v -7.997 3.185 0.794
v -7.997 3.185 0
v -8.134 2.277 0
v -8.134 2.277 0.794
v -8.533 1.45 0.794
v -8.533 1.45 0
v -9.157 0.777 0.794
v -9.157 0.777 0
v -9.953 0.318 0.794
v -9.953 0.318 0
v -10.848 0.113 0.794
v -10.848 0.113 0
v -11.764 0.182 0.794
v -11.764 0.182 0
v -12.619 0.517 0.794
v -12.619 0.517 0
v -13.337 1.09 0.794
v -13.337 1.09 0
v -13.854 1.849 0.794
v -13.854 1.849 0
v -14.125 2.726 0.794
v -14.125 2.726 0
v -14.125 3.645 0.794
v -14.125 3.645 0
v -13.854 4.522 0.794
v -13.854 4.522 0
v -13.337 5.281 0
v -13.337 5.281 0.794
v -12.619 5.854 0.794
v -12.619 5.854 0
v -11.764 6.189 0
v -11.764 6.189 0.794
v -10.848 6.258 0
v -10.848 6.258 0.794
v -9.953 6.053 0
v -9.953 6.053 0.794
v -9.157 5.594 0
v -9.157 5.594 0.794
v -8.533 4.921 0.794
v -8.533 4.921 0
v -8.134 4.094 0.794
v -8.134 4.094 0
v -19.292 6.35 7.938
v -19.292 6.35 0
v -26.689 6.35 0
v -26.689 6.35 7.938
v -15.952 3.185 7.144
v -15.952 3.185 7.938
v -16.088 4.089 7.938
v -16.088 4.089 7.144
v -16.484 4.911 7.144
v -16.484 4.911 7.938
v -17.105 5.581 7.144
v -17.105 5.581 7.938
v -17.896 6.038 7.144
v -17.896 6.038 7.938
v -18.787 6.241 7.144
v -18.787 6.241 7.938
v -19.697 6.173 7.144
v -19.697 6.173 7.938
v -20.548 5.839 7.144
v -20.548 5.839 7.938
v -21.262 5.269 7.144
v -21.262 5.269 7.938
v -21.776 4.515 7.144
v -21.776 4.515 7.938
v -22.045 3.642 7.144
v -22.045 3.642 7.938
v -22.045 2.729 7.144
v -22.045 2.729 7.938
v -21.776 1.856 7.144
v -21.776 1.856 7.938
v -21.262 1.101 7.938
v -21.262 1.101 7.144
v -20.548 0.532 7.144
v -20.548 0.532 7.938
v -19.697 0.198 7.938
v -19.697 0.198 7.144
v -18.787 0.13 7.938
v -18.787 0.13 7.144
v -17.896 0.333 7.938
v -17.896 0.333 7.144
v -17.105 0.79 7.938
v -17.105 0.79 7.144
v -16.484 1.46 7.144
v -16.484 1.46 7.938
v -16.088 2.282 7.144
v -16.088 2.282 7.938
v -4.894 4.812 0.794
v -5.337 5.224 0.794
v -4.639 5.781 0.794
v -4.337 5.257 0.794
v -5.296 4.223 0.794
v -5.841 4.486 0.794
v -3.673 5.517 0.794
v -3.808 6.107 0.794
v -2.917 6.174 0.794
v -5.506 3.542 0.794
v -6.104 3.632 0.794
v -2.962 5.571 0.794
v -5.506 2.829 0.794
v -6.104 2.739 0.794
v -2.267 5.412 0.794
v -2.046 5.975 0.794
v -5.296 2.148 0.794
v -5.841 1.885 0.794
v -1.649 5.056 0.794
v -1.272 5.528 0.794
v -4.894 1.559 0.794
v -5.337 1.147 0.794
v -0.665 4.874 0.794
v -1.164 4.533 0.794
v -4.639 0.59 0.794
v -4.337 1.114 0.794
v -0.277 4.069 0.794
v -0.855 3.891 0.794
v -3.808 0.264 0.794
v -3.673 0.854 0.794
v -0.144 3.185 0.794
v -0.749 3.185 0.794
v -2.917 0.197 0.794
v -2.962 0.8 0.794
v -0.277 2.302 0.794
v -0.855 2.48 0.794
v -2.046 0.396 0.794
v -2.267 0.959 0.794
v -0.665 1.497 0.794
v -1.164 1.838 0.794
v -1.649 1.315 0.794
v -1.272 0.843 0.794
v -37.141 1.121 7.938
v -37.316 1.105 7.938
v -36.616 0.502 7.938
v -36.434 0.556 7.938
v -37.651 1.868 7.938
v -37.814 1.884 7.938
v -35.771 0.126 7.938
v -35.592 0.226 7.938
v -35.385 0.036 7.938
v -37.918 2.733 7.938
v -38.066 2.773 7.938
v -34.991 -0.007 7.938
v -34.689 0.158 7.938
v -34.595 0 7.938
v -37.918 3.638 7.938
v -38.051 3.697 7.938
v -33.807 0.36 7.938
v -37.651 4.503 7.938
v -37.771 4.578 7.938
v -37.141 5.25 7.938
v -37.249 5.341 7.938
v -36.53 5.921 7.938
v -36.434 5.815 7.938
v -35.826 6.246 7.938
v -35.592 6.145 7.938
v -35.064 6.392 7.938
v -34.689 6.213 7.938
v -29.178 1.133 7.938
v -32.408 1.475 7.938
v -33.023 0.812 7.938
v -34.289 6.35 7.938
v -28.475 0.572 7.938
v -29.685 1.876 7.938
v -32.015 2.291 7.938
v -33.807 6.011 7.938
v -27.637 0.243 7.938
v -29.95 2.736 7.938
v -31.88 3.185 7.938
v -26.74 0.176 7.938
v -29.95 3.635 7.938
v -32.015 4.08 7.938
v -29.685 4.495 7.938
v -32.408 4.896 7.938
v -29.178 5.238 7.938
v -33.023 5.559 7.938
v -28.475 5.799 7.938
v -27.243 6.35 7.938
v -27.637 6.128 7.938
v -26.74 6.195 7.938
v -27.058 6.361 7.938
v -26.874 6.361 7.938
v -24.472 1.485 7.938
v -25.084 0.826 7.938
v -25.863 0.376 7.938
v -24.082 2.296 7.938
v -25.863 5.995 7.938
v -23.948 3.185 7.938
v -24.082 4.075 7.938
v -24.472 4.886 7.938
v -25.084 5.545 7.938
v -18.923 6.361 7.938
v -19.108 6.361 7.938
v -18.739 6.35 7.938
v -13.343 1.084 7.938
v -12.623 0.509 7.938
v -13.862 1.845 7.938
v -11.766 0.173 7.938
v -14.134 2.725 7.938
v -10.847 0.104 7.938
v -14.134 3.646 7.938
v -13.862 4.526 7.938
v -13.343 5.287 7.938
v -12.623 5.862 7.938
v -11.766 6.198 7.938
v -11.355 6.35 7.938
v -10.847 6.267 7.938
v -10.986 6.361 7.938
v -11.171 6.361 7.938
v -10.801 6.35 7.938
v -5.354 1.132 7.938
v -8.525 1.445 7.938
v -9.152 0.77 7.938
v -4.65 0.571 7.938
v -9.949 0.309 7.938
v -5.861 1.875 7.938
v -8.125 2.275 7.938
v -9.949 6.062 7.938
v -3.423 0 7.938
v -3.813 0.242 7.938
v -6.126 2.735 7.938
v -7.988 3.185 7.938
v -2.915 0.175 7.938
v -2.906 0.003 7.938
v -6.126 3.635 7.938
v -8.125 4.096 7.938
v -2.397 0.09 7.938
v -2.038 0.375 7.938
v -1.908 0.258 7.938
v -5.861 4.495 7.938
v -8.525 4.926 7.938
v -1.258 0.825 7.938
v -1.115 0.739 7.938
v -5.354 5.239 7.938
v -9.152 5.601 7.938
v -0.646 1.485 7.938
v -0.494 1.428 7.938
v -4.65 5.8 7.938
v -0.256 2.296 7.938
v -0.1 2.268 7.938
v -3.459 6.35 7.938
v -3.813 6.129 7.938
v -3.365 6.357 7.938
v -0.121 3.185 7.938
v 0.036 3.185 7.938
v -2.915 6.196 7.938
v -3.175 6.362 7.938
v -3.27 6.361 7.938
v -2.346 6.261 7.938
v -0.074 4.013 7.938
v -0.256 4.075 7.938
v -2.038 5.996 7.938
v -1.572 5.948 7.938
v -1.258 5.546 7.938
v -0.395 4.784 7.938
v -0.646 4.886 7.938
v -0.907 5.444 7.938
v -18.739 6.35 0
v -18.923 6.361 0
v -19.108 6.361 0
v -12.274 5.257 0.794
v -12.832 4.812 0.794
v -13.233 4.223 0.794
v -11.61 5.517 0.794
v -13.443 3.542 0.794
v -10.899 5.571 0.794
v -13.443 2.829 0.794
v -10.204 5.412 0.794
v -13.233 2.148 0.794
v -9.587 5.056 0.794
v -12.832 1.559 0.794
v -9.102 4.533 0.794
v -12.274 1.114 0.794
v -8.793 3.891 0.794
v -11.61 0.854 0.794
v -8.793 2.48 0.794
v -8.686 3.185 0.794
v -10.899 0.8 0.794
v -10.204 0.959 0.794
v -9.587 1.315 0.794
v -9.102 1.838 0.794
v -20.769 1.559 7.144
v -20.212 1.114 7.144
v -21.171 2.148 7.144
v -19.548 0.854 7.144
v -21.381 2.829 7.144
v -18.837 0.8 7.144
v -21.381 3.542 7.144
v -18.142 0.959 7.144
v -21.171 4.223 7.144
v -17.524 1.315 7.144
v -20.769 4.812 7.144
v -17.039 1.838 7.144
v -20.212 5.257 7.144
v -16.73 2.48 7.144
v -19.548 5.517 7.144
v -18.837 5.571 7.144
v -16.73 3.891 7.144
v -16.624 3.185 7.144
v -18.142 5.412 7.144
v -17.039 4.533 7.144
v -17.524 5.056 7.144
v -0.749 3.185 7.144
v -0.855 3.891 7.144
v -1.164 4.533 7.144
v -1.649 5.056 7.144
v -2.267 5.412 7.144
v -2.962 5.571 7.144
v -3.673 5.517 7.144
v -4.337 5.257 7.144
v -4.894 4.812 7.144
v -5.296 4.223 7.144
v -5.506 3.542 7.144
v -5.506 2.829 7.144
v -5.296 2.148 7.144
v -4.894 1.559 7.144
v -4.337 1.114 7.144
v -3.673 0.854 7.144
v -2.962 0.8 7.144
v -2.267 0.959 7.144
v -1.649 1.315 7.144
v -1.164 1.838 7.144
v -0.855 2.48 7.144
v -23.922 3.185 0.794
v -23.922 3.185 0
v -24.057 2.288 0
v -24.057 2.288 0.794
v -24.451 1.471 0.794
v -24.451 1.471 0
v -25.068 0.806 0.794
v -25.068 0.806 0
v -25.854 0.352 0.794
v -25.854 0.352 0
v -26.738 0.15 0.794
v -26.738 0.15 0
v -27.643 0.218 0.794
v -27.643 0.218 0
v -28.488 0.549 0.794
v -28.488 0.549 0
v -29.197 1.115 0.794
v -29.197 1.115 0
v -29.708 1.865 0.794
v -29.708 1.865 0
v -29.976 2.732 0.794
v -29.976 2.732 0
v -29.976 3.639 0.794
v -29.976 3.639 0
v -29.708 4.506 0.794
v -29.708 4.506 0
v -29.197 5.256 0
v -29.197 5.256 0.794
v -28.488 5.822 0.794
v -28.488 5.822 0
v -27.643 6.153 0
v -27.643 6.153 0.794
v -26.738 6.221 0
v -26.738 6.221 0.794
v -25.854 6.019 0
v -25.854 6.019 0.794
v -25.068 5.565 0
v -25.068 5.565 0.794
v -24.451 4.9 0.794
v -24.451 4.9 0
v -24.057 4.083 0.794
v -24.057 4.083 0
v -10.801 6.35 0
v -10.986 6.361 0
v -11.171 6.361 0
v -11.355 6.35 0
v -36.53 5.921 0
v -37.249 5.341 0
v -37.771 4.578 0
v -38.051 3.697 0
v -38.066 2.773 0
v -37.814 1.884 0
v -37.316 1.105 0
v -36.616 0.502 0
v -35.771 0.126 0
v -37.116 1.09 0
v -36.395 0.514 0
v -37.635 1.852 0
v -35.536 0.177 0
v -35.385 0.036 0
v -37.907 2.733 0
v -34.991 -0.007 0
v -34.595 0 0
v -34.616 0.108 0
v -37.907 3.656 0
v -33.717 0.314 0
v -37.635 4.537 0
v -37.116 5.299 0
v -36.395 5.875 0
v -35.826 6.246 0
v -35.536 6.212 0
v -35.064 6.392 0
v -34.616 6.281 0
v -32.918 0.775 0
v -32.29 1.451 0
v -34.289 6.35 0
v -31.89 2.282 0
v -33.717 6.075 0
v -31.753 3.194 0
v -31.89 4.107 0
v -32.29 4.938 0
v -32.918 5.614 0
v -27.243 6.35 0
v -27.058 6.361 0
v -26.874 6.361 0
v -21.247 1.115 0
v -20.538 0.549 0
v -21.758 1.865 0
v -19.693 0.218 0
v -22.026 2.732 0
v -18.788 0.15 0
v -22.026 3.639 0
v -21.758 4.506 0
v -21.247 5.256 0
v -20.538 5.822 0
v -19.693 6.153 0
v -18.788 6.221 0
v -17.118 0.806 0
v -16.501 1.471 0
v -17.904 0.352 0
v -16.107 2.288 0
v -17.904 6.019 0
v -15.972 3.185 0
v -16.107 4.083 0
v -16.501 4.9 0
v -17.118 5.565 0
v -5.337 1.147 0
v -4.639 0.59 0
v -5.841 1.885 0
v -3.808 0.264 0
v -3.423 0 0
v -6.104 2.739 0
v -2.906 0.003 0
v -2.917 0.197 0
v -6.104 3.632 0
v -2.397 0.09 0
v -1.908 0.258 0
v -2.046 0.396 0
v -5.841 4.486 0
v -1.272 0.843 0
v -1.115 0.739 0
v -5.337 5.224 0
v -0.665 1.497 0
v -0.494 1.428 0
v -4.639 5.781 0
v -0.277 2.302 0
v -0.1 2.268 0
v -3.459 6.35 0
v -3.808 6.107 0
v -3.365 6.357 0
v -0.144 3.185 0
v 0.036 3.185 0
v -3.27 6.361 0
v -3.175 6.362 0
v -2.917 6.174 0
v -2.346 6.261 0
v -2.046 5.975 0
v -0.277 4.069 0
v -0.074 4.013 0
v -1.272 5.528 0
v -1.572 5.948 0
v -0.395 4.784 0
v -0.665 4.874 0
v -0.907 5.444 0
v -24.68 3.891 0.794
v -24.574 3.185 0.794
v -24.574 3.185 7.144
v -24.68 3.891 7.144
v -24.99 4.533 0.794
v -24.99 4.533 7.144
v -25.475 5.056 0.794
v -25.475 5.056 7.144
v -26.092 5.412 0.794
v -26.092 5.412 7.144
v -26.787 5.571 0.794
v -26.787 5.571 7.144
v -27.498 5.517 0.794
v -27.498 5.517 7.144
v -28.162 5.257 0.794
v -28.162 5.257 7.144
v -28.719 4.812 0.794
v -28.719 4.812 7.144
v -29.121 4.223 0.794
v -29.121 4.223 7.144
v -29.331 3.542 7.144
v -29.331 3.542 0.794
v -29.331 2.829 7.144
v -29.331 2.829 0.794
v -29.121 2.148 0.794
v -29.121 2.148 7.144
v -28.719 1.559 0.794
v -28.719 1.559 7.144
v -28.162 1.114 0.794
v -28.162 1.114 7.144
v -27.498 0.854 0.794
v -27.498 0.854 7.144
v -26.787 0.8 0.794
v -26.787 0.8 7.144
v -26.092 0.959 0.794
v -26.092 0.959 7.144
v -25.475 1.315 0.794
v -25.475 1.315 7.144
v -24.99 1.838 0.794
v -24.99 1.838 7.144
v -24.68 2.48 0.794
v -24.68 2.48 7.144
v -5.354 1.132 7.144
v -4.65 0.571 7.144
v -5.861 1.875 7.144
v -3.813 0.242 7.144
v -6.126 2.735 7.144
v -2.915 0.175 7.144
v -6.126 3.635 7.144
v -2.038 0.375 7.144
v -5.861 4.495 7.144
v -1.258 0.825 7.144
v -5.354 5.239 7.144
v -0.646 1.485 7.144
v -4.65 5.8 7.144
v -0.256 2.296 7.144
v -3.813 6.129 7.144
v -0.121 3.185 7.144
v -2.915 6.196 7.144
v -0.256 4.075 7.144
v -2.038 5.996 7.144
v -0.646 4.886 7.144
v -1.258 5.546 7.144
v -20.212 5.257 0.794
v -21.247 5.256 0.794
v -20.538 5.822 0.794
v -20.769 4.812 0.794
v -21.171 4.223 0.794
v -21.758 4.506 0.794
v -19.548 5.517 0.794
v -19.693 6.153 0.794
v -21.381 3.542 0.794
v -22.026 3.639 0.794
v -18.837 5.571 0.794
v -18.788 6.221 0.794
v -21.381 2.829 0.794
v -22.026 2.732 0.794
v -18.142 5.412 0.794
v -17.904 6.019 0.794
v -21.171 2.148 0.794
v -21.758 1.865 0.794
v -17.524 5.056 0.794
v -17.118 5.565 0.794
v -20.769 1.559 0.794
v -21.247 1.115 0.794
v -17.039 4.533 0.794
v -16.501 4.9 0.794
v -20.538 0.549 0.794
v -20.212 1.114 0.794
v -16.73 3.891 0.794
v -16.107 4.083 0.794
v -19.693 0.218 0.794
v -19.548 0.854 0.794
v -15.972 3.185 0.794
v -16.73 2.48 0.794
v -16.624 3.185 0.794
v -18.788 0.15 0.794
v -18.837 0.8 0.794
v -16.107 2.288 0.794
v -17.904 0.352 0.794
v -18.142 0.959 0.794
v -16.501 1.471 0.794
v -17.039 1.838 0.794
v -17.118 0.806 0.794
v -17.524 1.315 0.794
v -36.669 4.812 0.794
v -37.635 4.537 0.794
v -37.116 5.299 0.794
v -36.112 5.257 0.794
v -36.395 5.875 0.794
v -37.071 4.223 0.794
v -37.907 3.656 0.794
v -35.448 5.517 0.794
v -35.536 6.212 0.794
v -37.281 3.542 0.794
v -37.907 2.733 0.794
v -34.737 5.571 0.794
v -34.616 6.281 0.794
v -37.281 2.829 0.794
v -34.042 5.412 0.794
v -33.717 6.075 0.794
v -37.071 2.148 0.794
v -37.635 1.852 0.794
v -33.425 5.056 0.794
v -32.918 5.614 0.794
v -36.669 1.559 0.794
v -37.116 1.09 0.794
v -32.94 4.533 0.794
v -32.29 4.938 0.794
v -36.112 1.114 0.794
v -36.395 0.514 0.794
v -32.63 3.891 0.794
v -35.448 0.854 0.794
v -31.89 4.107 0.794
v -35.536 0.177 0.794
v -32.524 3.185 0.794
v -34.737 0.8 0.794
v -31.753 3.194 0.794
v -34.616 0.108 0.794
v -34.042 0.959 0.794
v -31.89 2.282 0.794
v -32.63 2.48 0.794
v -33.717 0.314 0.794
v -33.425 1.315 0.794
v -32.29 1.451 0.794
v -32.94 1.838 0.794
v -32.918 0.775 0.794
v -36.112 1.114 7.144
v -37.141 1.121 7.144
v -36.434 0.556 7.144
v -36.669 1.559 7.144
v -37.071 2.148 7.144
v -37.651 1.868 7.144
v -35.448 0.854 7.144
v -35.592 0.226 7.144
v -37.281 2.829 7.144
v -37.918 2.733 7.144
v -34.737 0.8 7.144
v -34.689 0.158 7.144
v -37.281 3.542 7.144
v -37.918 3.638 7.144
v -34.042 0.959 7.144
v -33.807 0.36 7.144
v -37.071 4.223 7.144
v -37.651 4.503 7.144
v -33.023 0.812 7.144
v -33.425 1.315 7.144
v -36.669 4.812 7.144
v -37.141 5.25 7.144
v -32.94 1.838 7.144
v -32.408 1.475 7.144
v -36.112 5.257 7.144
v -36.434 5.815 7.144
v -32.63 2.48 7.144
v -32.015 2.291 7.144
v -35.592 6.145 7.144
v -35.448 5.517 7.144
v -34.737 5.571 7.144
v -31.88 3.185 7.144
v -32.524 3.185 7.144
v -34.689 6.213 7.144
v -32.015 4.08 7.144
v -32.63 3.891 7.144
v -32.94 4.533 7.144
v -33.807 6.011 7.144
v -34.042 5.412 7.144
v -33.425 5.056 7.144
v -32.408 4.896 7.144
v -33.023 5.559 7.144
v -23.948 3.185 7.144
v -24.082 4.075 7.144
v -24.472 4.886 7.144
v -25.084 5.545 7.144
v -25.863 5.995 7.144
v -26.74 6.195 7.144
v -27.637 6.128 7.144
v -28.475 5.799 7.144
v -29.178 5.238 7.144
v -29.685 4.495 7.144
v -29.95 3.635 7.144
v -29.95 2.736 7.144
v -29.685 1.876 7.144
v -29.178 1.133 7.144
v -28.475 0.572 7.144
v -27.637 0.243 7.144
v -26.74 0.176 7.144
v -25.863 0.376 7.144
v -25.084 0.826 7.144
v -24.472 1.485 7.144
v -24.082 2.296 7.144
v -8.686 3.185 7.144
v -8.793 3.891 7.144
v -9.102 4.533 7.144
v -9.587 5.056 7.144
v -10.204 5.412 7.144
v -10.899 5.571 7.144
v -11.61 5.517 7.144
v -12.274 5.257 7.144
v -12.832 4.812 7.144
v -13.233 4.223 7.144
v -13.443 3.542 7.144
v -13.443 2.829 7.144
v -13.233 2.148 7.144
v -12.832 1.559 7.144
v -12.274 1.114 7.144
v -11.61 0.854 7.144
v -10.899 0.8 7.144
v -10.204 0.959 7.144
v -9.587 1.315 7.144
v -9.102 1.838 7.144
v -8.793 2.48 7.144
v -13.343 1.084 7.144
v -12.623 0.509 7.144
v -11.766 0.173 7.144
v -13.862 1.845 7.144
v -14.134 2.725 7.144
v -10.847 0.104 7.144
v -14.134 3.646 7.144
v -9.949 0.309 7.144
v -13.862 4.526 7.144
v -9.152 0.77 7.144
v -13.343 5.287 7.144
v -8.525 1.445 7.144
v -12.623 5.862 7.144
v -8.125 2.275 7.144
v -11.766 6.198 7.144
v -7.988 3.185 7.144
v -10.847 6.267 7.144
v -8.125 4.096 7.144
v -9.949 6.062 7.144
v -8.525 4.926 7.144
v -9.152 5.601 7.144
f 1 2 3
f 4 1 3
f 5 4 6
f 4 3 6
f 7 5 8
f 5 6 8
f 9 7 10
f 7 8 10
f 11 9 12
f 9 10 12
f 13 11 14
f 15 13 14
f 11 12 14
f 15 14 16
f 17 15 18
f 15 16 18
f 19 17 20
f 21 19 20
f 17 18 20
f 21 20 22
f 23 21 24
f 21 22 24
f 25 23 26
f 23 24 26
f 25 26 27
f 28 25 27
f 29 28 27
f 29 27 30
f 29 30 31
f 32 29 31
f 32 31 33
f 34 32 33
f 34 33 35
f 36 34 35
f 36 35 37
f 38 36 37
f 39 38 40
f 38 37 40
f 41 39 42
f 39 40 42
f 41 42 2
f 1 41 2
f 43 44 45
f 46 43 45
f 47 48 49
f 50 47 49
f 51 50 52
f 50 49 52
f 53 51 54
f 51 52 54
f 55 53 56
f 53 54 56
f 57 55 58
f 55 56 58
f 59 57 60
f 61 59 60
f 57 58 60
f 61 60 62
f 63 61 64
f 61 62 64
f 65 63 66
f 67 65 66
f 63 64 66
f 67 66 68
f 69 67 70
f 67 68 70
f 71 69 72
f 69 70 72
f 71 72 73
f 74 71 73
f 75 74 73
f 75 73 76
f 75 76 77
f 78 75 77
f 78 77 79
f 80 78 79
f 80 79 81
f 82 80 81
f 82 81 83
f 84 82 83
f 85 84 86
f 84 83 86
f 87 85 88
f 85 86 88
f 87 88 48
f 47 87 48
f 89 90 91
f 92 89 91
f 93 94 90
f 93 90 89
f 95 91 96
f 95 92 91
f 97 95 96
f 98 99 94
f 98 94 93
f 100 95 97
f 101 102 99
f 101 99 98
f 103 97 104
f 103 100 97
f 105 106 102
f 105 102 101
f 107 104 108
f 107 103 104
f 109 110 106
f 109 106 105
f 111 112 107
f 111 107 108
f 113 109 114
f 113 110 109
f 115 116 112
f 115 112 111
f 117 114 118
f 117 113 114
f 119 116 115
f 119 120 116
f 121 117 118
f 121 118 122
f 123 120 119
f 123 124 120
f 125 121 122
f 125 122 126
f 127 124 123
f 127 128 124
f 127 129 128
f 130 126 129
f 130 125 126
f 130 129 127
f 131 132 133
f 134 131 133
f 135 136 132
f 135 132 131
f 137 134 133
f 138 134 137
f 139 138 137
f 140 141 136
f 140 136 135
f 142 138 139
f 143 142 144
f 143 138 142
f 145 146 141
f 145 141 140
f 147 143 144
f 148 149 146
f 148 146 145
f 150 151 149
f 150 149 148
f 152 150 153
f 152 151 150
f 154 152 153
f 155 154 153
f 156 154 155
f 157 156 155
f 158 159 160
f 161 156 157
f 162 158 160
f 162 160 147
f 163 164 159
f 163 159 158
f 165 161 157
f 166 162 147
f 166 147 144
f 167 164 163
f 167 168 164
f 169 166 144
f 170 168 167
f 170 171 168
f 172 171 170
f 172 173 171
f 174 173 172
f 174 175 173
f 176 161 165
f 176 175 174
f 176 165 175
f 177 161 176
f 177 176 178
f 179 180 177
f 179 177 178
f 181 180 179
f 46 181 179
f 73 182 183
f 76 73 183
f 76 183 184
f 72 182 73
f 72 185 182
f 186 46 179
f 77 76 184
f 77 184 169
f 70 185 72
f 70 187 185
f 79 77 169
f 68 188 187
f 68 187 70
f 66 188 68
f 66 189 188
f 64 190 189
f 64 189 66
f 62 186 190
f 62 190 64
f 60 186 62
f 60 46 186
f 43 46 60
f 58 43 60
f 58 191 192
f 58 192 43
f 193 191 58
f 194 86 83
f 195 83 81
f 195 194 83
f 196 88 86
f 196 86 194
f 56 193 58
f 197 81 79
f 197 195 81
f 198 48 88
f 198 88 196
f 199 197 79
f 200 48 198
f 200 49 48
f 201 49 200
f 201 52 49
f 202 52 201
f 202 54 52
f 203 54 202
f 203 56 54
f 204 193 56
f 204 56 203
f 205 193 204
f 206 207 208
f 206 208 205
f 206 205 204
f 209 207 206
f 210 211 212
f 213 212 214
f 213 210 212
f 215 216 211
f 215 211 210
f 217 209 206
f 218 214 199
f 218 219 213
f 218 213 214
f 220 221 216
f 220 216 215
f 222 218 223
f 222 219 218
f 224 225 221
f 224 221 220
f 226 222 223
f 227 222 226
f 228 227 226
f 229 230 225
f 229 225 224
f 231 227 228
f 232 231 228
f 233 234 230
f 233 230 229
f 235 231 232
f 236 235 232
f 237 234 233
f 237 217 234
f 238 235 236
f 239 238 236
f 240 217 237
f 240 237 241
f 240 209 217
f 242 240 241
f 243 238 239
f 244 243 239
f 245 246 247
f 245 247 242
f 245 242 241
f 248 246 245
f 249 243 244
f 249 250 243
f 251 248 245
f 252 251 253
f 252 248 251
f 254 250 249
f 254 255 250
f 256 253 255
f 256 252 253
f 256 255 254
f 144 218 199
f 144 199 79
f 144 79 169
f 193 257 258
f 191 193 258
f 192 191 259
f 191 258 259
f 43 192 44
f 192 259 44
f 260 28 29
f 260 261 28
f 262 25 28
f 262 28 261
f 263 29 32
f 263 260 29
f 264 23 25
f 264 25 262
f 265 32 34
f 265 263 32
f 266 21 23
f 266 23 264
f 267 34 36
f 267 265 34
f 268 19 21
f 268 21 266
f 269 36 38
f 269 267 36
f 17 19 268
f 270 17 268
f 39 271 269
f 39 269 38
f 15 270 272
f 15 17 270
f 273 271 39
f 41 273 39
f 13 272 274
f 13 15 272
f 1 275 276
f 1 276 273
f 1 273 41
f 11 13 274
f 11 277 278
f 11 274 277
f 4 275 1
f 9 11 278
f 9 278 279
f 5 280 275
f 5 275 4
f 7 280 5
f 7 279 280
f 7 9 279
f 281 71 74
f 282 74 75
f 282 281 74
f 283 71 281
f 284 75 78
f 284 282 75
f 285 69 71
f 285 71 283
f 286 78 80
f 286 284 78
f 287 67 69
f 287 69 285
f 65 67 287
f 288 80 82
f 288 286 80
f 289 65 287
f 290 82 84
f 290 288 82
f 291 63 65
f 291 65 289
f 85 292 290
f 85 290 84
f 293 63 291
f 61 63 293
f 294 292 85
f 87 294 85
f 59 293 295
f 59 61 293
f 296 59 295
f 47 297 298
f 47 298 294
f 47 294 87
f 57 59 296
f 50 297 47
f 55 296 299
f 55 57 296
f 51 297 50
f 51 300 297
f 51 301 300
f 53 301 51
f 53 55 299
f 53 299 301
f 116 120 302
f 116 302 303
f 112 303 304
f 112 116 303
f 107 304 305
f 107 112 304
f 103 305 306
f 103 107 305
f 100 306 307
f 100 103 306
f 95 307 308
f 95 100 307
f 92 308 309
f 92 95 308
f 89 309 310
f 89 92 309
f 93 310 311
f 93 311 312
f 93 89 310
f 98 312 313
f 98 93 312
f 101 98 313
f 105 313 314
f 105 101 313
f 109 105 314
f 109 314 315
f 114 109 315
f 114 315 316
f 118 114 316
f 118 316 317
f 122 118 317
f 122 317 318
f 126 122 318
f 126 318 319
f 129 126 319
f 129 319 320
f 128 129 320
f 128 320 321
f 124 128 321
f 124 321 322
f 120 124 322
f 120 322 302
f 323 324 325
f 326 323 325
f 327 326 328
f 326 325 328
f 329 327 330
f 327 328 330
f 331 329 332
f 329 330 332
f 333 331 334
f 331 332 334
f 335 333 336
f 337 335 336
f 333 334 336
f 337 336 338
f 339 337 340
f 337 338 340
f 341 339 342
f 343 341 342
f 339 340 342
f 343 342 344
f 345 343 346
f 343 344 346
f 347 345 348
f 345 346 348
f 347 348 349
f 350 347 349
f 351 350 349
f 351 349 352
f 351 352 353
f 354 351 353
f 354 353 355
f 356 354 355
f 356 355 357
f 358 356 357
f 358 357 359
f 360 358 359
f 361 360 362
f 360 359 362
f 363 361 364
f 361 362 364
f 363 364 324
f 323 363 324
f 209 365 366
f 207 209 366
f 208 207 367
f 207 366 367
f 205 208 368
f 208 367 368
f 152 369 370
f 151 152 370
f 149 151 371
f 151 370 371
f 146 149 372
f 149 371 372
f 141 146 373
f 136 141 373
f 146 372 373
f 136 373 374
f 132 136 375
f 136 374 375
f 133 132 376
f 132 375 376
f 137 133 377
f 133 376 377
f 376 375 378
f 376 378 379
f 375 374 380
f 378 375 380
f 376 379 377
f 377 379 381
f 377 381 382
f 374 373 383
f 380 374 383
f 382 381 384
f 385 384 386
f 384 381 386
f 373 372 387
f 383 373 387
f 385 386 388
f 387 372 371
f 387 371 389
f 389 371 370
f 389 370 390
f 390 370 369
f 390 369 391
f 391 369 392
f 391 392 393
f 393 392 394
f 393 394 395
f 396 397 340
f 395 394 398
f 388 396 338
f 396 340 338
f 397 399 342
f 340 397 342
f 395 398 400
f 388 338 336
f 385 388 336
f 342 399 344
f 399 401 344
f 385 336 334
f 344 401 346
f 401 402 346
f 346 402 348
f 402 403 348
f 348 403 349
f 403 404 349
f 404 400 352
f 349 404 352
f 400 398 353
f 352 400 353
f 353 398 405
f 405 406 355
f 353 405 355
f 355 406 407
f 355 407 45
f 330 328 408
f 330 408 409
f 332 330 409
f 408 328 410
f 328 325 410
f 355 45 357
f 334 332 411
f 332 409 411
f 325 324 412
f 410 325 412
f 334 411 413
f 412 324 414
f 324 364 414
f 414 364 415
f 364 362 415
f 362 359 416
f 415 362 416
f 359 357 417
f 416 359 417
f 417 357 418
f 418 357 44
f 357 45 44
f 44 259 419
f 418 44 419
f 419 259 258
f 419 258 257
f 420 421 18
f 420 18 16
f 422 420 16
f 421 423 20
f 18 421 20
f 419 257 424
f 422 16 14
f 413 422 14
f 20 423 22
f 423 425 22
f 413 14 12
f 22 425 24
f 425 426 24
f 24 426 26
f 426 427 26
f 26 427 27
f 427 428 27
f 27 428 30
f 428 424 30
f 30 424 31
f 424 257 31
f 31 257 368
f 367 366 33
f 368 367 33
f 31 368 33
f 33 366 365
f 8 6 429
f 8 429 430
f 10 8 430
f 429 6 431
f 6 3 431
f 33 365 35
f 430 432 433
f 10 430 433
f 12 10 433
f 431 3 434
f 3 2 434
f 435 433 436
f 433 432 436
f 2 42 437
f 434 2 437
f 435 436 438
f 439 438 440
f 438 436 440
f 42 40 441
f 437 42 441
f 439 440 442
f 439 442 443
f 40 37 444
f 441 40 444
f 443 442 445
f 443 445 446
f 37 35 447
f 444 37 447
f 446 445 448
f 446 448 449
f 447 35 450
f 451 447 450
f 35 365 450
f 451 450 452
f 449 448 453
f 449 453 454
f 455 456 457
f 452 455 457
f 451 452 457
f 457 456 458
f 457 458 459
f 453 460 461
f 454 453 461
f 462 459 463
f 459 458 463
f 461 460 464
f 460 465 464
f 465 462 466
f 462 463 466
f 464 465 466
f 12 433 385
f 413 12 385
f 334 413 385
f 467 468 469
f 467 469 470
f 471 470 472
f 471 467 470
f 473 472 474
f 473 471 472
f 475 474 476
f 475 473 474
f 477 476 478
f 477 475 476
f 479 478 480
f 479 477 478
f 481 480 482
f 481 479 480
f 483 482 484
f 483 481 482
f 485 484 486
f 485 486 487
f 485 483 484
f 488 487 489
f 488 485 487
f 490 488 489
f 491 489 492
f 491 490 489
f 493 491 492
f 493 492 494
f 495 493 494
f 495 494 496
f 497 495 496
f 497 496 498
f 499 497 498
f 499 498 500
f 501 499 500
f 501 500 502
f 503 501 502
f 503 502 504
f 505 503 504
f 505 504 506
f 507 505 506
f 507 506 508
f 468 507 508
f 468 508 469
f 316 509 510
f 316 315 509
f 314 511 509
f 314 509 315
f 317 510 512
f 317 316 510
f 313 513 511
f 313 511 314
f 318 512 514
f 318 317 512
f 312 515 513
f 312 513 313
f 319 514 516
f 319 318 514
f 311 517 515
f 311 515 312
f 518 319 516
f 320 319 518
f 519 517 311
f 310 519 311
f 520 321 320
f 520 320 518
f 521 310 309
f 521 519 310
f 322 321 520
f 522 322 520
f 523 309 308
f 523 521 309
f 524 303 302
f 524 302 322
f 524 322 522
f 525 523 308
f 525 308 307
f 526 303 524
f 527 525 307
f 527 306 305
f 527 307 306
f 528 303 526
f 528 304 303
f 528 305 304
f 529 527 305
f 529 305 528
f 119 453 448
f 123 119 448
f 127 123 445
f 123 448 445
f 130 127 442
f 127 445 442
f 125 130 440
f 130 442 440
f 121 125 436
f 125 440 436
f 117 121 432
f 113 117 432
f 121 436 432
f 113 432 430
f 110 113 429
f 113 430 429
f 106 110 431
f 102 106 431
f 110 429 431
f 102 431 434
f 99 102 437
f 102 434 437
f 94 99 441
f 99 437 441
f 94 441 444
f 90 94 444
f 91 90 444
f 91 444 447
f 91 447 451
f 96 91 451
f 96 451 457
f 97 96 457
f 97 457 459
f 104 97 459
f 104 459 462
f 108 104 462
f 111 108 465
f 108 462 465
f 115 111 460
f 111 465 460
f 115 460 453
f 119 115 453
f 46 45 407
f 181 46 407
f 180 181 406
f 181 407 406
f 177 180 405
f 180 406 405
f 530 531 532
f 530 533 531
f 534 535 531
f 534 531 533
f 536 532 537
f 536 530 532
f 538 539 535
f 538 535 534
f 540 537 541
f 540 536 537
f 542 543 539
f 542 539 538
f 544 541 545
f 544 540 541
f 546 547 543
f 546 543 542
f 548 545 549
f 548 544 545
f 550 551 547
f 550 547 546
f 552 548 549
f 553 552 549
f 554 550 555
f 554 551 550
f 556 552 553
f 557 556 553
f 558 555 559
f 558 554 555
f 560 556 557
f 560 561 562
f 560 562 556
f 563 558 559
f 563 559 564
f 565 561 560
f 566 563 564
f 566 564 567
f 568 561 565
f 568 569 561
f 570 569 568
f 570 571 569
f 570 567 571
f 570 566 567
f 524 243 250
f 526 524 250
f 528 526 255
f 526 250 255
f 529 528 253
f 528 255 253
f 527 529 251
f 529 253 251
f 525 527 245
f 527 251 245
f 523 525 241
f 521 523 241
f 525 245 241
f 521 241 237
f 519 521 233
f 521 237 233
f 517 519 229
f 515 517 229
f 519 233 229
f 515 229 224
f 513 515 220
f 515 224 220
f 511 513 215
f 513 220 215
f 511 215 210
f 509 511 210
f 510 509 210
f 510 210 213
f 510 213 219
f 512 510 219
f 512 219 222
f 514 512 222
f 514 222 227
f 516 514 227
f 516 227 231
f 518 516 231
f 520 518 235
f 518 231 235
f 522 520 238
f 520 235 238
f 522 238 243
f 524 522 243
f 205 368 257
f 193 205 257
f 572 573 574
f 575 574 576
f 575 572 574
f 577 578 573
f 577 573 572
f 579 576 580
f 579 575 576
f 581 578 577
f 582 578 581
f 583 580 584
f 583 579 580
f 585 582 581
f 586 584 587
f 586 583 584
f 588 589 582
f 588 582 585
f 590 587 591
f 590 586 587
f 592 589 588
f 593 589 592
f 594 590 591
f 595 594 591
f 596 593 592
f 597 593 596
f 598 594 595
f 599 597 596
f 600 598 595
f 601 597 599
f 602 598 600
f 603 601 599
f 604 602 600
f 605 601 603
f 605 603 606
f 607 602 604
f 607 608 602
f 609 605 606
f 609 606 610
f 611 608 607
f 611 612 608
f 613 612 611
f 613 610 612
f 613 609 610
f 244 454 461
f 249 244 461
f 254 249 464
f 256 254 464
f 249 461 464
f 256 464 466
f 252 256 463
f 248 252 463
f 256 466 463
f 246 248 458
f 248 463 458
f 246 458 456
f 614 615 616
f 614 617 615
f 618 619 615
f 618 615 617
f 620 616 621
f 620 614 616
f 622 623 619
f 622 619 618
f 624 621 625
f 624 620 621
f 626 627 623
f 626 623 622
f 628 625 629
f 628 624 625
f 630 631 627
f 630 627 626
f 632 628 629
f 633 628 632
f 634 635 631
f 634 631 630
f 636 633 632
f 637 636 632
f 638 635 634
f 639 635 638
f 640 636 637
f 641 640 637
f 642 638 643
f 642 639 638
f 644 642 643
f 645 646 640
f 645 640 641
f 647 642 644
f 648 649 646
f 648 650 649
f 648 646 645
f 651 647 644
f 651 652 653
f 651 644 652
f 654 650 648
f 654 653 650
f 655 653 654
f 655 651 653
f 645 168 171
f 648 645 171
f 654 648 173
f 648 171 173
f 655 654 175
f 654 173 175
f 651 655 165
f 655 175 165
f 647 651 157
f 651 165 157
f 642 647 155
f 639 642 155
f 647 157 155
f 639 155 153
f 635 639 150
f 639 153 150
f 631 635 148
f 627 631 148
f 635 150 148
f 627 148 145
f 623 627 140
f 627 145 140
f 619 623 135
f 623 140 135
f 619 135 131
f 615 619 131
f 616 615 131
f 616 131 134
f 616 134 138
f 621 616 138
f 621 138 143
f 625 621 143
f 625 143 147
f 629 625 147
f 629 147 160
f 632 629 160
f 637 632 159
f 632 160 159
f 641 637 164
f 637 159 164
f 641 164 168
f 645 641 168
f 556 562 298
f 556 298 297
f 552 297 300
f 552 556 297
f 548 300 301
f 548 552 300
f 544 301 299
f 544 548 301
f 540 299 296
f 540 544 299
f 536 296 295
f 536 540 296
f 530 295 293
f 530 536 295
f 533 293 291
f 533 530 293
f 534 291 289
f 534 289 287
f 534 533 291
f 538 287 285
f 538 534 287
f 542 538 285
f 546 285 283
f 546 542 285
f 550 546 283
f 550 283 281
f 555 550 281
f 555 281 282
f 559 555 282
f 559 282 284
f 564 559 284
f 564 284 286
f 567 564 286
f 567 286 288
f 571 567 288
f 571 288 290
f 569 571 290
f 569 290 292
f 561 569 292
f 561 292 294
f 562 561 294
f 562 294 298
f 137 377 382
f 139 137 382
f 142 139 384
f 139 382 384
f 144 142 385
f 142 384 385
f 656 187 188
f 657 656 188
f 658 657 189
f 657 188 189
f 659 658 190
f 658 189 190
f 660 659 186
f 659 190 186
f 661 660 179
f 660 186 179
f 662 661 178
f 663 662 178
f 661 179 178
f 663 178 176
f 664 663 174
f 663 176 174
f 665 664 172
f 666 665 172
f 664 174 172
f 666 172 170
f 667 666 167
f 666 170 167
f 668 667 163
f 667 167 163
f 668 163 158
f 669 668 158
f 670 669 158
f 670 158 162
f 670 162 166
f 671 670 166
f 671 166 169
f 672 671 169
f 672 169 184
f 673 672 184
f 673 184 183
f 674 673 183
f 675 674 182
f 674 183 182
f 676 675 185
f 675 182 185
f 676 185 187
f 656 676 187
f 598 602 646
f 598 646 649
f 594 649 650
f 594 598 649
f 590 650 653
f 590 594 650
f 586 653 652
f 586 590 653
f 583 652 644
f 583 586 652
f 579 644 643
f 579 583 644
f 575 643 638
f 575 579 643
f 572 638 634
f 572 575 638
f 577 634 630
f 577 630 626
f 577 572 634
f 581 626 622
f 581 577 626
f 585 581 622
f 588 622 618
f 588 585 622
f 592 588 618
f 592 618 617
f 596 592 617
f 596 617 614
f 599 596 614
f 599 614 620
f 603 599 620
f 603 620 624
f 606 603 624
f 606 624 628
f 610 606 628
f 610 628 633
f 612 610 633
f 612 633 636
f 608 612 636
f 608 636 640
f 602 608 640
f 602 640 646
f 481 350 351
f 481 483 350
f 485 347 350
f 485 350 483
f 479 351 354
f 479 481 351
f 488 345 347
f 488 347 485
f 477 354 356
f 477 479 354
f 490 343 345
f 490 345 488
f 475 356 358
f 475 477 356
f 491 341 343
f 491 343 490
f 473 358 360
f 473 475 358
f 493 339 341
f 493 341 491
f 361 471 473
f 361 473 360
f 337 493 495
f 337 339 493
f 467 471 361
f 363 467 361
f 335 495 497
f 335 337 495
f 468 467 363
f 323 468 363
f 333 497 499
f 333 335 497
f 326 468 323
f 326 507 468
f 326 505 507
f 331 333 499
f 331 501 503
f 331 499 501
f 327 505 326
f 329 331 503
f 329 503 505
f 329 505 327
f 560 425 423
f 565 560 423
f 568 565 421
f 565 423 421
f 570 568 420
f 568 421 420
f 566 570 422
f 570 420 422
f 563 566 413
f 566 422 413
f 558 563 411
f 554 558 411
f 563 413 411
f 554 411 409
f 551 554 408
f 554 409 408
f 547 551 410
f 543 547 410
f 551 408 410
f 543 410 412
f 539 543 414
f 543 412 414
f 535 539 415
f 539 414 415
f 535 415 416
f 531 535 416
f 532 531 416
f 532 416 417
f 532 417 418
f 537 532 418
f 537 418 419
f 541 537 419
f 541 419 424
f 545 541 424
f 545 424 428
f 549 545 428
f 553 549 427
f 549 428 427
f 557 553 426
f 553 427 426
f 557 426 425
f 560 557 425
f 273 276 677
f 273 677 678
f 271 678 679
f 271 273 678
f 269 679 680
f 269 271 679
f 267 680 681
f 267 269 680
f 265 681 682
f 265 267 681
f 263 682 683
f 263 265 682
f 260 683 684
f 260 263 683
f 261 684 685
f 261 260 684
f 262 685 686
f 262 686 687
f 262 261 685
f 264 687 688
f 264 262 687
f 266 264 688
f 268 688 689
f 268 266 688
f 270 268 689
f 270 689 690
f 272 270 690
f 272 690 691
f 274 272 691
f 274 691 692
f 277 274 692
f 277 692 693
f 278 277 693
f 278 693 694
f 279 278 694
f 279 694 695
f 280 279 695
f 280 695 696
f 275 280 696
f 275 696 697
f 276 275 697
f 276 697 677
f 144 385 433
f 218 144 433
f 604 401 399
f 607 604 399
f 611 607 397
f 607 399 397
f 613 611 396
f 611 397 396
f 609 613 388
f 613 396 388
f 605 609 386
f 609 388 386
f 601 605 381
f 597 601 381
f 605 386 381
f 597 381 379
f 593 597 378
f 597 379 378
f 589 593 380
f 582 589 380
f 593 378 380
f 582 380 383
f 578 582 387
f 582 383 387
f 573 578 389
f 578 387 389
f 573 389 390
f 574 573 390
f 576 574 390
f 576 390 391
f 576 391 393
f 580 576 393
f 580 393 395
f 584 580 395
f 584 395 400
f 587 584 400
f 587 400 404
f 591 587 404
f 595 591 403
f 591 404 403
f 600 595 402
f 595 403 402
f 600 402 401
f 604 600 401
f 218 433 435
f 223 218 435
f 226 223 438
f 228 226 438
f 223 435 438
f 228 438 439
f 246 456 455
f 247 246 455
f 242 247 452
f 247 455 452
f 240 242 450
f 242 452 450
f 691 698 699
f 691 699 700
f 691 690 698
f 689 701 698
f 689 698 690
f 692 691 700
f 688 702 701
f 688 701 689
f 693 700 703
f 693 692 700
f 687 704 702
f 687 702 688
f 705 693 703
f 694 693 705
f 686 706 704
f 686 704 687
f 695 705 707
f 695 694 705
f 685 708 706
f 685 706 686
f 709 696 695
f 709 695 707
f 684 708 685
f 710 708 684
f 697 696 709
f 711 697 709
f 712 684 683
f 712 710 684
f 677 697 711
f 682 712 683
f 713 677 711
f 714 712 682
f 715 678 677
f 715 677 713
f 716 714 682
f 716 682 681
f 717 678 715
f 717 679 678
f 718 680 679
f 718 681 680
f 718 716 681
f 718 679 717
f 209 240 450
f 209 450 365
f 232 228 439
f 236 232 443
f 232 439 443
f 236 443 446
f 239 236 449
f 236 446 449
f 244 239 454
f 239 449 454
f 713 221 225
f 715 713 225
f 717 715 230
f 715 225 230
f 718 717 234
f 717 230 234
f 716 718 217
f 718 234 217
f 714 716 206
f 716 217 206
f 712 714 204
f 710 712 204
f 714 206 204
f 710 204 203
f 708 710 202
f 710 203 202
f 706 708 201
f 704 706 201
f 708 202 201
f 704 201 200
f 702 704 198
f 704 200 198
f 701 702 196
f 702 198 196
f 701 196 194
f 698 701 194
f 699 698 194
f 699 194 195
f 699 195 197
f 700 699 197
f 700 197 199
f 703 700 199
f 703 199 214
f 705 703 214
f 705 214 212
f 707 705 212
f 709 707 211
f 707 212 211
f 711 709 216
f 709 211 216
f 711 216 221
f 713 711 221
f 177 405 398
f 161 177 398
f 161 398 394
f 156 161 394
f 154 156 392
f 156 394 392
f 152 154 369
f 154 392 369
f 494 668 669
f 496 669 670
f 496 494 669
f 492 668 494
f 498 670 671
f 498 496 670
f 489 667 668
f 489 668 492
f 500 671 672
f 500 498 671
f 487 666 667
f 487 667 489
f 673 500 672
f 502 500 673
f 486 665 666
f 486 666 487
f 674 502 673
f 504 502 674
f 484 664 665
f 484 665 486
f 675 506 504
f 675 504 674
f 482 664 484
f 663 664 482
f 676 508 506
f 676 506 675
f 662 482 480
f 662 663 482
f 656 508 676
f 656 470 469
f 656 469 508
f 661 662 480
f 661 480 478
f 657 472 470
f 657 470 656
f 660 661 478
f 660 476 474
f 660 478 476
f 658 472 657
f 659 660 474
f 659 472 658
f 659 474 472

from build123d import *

# Parameters (mm, degrees)
F0_R     = 2.3919393617
F1_DEPTH = 7.9375
F2_R     = 3.0192979406
F2_R_2   = 2.3919393617
F2_R_3   = 3.0900236713
F2_R_4   = 3.0639016039
F2_R_5   = 3.0180013539
F2_R_6   = 3.0358198122
F3_DEPTH = 0.79375
F4_R     = 3.0946781872
F4_R_2   = 2.3919393617
F4_R_3   = 3.0440395285
F4_R_4   = 3.0438317033
F4_R_5   = 3.080942185
F4_R_6   = 2.996685824
F5_DEPTH = 0.79375


with BuildPart() as f1:
    # F0 (on Top) → F1 (new body)
    with BuildSketch(Plane.XY):
        with BuildLine():
            ThreePointArc((-3.1748391564, 6.3618900805), (-0.0650994939, 3.8236435926), (-1.9082323266, 0.2576882701))
            ThreePointArc((-1.9082323266, 0.2576882701), (-0.4943758214, 1.4282223533), (0.0359294434, 3.1854692293))
            ThreePointArc((0.0359294434, 3.1854692293), (-0.9065879549, 5.443714368), (-3.1748391564, 6.3618900805))
        make_face()
        with BuildLine():
            ThreePointArc((-36.5301852994, 5.9214270067), (-38.0657970886, 2.7730759979), (-35.7714141925, 0.1261863575))
            ThreePointArc((-35.7714141925, 0.1261863575), (-38.0245779178, 2.7784728257), (-36.5301852994, 5.9214270067))
        make_face()
        with BuildLine():
            ThreePointArc((-26.6891774485, 6.35), (-26.9658751282, 6.362073801), (-27.2425728079, 6.35))
            Line((-27.2425728079, 6.35), (-26.6891774485, 6.35))
        make_face()
        with BuildLine():
            Line((-19.2923728079, 6.35), (-18.7389774485, 6.35))
            ThreePointArc((-18.7389774485, 6.35), (-19.0156751282, 6.362073801), (-19.2923728079, 6.35))
        make_face()
        with BuildLine():
            Line((-11.3548728079, 6.35), (-10.8014774485, 6.35))
            ThreePointArc((-10.8014774485, 6.35), (-11.0781751282, 6.362073801), (-11.3548728079, 6.35))
        make_face()
        with BuildLine():
            Line((-34.594617784, 0), (-3.4232600592, 0))
            ThreePointArc((-3.4232600592, 0), (-2.6499734267, 0.0361112438), (-1.9082323266, 0.2576882701))
            ThreePointArc((-1.9082323266, 0.2576882701), (-6.2510268672, 2.54007891), (-3.1748391564, 6.3618900805))
            ThreePointArc((-3.1748391564, 6.3618900805), (-3.3171702803, 6.3591232625), (-3.4592356533, 6.35))
            Line((-3.4592356533, 6.35), (-10.8014774485, 6.35))
            ThreePointArc((-10.8014774485, 6.35), (-8.7361913838, 5.331611989), (-7.9015705566, 3.1854692293))
            ThreePointArc((-7.9015705566, 3.1854692293), (-13.224317888, 0.8434854848), (-11.3548728079, 6.35))
            Line((-11.3548728079, 6.35), (-18.7389774485, 6.35))
            ThreePointArc((-18.7389774485, 6.35), (-16.6736913838, 5.331611989), (-15.8390705566, 3.1854692293))
            ThreePointArc((-15.8390705566, 3.1854692293), (-21.161817888, 0.8434854848), (-19.2923728079, 6.35))
            Line((-19.2923728079, 6.35), (-26.6891774485, 6.35))
            ThreePointArc((-26.6891774485, 6.35), (-24.6238913838, 5.331611989), (-23.7892705566, 3.1854692293))
            ThreePointArc((-23.7892705566, 3.1854692293), (-29.112017888, 0.8434854848), (-27.2425728079, 6.35))
            Line((-27.2425728079, 6.35), (-34.2893563211, 6.35))
            ThreePointArc((-34.2893563211, 6.35), (-35.4492032163, 6.3418890662), (-36.5301852994, 5.9214270067))
            ThreePointArc((-36.5301852994, 5.9214270067), (-33.3407296335, 5.9439295203), (-31.7394705566, 3.1854692293))
            ThreePointArc((-31.7394705566, 3.1854692293), (-32.9959523948, 0.6548674643), (-35.7714141925, 0.1261863575))
            ThreePointArc((-35.7714141925, 0.1261863575), (-35.1888922767, 0.0082917303), (-34.594617784, 0))
        make_face()
        with BuildLine():
            ThreePointArc((-36.5301852994, 5.9214270067), (-38.0245779178, 2.7784728257), (-35.7714141925, 0.1261863575))
            ThreePointArc((-35.7714141925, 0.1261863575), (-32.9959523948, 0.6548674643), (-31.7394705566, 3.1854692293))
            ThreePointArc((-31.7394705566, 3.1854692293), (-33.3407296335, 5.9439295203), (-36.5301852994, 5.9214270067))
        make_face()
        with Locations((-34.9160751282, 3.1854692293)):
            Circle(F0_R, mode=Mode.SUBTRACT)
        with BuildLine():
            Line((-26.6891774485, 6.35), (-27.2425728079, 6.35))
            ThreePointArc((-27.2425728079, 6.35), (-29.112017888, 0.8434854848), (-23.7892705566, 3.1854692293))
            ThreePointArc((-23.7892705566, 3.1854692293), (-24.6238913838, 5.331611989), (-26.6891774485, 6.35))
        make_face()
        with Locations((-26.9658751282, 3.1854692293)):
            Circle(F0_R, mode=Mode.SUBTRACT)
        with BuildLine():
            ThreePointArc((-15.8390705566, 3.1854692293), (-16.6736913838, 5.331611989), (-18.7389774485, 6.35))
            Line((-18.7389774485, 6.35), (-19.2923728079, 6.35))
            ThreePointArc((-19.2923728079, 6.35), (-21.161817888, 0.8434854848), (-15.8390705566, 3.1854692293))
        make_face()
        with Locations((-19.0156751282, 3.1854692293)):
            Circle(F0_R, mode=Mode.SUBTRACT)
        with BuildLine():
            ThreePointArc((-7.9015705566, 3.1854692293), (-8.7361913838, 5.331611989), (-10.8014774485, 6.35))
            Line((-10.8014774485, 6.35), (-11.3548728079, 6.35))
            ThreePointArc((-11.3548728079, 6.35), (-13.224317888, 0.8434854848), (-7.9015705566, 3.1854692293))
        make_face()
        with Locations((-11.0781751282, 3.1854692293)):
            Circle(F0_R, mode=Mode.SUBTRACT)
        with BuildLine():
            ThreePointArc((-3.1748391564, 6.3618900805), (-6.2510268672, 2.54007891), (-1.9082323266, 0.2576882701))
            ThreePointArc((-1.9082323266, 0.2576882701), (-0.0650994939, 3.8236435926), (-3.1748391564, 6.3618900805))
        make_face()
        with Locations((-3.1406751282, 3.1854692293)):
            Circle(F0_R, mode=Mode.SUBTRACT)
    extrude(amount=F1_DEPTH)

    # F2 (on face) → F3 (cut)
    with BuildSketch(Plane.XY.offset(7.9375)):
        with Locations((-3.1406751282, 3.1854692293)):
            Circle(F2_R)
        with Locations((-3.1406751282, 3.1854692293)):
            Circle(F2_R_2, mode=Mode.SUBTRACT)
        with Locations((-11.0781751282, 3.1854692293)):
            Circle(F2_R_3)
        with Locations((-11.0781751282, 3.1854692293)):
            Circle(F2_R_2, mode=Mode.SUBTRACT)
        with Locations((-19.0156751282, 3.1854692293)):
            Circle(F2_R_4)
        with Locations((-19.0156751282, 3.1854692293)):
            Circle(F2_R_2, mode=Mode.SUBTRACT)
        with Locations((-26.9658751282, 3.1854692293)):
            Circle(F2_R_5)
        with Locations((-26.9658751282, 3.1854692293)):
            Circle(F2_R_2, mode=Mode.SUBTRACT)
        with Locations((-34.9160751282, 3.1854692293)):
            Circle(F2_R_6)
        with Locations((-34.9160751282, 3.1854692293)):
            Circle(F2_R_2, mode=Mode.SUBTRACT)
    extrude(amount=-F3_DEPTH, mode=Mode.SUBTRACT)

    # F4 (on face) → F5 (cut)
    with BuildSketch(Plane(origin=(0, 0, 0), x_dir=(1, 0, 0), z_dir=(0, 0, -1))):
        with Locations((-34.8472412506, -3.1944816519)):
            Circle(F4_R)
        with Locations((-34.9160751282, -3.1854692293)):
            Circle(F4_R_2, mode=Mode.SUBTRACT)
        with Locations((-26.9658751282, -3.1854692293)):
            Circle(F4_R_3)
        with Locations((-26.9658751282, -3.1854692293)):
            Circle(F4_R_2, mode=Mode.SUBTRACT)
        with Locations((-19.0156751282, -3.1854692293)):
            Circle(F4_R_4)
        with Locations((-19.0156751282, -3.1854692293)):
            Circle(F4_R_2, mode=Mode.SUBTRACT)
        with Locations((-11.0781751282, -3.1854692293)):
            Circle(F4_R_5)
        with Locations((-11.0781751282, -3.1854692293)):
            Circle(F4_R_2, mode=Mode.SUBTRACT)
        with Locations((-3.1406751282, -3.1854692293)):
            Circle(F4_R_6)
        with Locations((-3.1406751282, -3.1854692293)):
            Circle(F4_R_2, mode=Mode.SUBTRACT)
    extrude(amount=-F5_DEPTH, mode=Mode.SUBTRACT)


solid = f1.part
